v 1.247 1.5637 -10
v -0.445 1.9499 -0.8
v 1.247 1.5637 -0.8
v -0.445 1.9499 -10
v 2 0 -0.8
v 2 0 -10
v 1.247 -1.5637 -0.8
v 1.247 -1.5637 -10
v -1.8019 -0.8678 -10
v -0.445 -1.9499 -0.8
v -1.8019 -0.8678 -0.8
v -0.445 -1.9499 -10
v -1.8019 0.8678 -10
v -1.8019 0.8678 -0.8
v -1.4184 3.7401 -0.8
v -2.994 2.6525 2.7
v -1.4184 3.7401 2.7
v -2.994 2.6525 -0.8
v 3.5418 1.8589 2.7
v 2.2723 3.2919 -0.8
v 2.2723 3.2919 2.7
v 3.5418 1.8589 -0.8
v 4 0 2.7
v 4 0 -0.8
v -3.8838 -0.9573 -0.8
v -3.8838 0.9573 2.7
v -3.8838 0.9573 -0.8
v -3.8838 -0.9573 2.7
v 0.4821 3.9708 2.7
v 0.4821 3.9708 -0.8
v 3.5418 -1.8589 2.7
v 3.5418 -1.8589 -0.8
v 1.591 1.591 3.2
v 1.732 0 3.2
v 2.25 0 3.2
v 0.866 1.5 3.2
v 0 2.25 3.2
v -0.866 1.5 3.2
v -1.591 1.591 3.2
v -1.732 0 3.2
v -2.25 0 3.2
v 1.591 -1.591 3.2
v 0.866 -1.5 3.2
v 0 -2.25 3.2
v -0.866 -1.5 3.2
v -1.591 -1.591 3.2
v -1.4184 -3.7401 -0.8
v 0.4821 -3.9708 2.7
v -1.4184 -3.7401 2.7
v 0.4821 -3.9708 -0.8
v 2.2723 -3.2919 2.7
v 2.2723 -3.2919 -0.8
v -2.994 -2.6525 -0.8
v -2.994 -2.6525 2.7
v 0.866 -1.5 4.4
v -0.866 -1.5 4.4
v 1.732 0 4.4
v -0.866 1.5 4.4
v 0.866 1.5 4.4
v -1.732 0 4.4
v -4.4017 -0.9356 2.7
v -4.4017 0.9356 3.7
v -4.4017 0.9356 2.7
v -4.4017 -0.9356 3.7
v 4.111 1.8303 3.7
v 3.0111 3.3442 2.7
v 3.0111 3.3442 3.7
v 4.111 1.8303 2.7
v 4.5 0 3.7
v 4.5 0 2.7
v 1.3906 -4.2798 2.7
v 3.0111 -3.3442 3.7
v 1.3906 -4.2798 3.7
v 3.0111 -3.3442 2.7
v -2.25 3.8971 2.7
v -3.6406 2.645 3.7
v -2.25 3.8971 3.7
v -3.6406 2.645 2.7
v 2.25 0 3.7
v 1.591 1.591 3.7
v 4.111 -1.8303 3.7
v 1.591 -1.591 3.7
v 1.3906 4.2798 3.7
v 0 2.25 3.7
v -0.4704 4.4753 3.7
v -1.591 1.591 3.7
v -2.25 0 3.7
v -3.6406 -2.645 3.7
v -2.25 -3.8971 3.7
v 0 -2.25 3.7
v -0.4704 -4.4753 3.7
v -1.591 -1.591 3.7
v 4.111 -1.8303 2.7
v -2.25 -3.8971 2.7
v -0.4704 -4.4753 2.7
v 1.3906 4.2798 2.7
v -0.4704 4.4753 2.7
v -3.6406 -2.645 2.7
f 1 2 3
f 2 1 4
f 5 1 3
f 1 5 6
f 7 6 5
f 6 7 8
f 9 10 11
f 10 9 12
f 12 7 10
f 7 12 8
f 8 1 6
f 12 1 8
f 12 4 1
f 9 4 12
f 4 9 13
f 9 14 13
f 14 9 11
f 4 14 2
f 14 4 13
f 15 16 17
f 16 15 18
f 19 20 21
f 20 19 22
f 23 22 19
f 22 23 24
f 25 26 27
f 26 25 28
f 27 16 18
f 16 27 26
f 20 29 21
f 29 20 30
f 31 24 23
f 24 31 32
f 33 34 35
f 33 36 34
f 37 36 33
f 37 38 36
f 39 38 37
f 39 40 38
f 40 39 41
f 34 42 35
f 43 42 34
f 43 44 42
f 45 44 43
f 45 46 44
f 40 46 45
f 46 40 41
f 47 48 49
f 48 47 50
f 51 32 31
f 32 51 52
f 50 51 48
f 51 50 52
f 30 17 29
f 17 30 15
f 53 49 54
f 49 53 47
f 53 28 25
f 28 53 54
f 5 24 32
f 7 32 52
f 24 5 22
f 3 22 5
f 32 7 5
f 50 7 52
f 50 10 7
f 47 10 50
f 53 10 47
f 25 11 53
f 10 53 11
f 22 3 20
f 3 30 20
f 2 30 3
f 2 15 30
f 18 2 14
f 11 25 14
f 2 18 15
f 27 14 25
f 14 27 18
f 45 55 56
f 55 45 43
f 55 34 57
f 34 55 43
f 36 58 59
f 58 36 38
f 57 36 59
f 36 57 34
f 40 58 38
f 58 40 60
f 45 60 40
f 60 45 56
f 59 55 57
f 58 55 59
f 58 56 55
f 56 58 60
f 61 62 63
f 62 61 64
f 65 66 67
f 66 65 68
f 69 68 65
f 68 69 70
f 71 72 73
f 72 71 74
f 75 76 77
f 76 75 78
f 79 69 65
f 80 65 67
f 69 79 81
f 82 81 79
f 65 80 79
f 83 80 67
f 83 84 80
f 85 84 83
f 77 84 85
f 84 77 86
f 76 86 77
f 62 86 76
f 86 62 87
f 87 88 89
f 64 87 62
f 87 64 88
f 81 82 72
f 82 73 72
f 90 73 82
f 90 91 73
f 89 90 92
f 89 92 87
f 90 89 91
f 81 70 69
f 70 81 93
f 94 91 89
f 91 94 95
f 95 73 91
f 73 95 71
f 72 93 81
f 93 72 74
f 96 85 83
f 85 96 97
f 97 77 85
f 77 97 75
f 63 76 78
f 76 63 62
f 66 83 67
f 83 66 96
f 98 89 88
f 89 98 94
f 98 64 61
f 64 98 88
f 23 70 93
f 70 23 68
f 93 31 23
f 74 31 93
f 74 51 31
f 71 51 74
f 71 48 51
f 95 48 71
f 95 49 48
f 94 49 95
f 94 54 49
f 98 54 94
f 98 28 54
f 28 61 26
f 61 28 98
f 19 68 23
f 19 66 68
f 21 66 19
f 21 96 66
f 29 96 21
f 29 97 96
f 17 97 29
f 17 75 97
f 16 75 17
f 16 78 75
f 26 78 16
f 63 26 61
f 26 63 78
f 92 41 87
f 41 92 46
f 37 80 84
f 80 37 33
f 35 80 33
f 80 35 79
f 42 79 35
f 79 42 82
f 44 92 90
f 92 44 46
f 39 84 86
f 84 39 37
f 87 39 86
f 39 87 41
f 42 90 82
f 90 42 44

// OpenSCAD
// Parameters
thread_diameter_mm = 4; //[2:8:0.1]
length_mm = 10; //[5:20:0.5]
head_diameter_mm = 8; //[4:16:0.1]
head_height_mm = 4; //[2:8:0.1]
socket_across_flats_mm = 3; //[1.5:6:0.1]
socket_depth_mm = 2.5; //[1:6:0.1]
washer_outer_diameter_mm = 9; //[6:18:0.1]
washer_inner_diameter_mm = 4.5; //[3:9:0.1]
washer_thickness_mm = 1; //[0.5:3:0.1]
overlap_mm = 0.8; //[0.5:2:0.1]

// Screw and Washer - Complete Geometry
module screw_and_washer() {
  // Screw
  color("DimGray") {
    union() {
      // Threaded Shaft
      translate([0, 0, -length_mm/2])
        cylinder(h=length_mm, r=thread_diameter_mm/2, center=true);
      
      // Cylindrical Head
      translate([0, 0, head_height_mm/2 - overlap_mm])
        cylinder(h=head_height_mm, r=head_diameter_mm/2, center=true);
    }
    
    // Hex Socket Recess
    translate([0, 0, head_height_mm - socket_depth_mm/2])
      rotate([0, 0, 0])
      difference() {
        cylinder(h=socket_depth_mm + overlap_mm, r=socket_across_flats_mm/(2*cos(30)), center=true);
      }
  }
  
  // Washer
  color("Silver") {
    translate([0, 0, head_height_mm - overlap_mm]) {
      difference() {
        // Washer Outer
        cylinder(h=washer_thickness_mm, r=washer_outer_diameter_mm/2, center=true);
        
        // Washer Hole
        translate([0, 0, 0])
          cylinder(h=washer_thickness_mm + 2*overlap_mm, r=washer_inner_diameter_mm/2, center=true);
      }
    }
  }
}

// Assembly
module assembly() {
  screw_and_washer();
}

assembly();
